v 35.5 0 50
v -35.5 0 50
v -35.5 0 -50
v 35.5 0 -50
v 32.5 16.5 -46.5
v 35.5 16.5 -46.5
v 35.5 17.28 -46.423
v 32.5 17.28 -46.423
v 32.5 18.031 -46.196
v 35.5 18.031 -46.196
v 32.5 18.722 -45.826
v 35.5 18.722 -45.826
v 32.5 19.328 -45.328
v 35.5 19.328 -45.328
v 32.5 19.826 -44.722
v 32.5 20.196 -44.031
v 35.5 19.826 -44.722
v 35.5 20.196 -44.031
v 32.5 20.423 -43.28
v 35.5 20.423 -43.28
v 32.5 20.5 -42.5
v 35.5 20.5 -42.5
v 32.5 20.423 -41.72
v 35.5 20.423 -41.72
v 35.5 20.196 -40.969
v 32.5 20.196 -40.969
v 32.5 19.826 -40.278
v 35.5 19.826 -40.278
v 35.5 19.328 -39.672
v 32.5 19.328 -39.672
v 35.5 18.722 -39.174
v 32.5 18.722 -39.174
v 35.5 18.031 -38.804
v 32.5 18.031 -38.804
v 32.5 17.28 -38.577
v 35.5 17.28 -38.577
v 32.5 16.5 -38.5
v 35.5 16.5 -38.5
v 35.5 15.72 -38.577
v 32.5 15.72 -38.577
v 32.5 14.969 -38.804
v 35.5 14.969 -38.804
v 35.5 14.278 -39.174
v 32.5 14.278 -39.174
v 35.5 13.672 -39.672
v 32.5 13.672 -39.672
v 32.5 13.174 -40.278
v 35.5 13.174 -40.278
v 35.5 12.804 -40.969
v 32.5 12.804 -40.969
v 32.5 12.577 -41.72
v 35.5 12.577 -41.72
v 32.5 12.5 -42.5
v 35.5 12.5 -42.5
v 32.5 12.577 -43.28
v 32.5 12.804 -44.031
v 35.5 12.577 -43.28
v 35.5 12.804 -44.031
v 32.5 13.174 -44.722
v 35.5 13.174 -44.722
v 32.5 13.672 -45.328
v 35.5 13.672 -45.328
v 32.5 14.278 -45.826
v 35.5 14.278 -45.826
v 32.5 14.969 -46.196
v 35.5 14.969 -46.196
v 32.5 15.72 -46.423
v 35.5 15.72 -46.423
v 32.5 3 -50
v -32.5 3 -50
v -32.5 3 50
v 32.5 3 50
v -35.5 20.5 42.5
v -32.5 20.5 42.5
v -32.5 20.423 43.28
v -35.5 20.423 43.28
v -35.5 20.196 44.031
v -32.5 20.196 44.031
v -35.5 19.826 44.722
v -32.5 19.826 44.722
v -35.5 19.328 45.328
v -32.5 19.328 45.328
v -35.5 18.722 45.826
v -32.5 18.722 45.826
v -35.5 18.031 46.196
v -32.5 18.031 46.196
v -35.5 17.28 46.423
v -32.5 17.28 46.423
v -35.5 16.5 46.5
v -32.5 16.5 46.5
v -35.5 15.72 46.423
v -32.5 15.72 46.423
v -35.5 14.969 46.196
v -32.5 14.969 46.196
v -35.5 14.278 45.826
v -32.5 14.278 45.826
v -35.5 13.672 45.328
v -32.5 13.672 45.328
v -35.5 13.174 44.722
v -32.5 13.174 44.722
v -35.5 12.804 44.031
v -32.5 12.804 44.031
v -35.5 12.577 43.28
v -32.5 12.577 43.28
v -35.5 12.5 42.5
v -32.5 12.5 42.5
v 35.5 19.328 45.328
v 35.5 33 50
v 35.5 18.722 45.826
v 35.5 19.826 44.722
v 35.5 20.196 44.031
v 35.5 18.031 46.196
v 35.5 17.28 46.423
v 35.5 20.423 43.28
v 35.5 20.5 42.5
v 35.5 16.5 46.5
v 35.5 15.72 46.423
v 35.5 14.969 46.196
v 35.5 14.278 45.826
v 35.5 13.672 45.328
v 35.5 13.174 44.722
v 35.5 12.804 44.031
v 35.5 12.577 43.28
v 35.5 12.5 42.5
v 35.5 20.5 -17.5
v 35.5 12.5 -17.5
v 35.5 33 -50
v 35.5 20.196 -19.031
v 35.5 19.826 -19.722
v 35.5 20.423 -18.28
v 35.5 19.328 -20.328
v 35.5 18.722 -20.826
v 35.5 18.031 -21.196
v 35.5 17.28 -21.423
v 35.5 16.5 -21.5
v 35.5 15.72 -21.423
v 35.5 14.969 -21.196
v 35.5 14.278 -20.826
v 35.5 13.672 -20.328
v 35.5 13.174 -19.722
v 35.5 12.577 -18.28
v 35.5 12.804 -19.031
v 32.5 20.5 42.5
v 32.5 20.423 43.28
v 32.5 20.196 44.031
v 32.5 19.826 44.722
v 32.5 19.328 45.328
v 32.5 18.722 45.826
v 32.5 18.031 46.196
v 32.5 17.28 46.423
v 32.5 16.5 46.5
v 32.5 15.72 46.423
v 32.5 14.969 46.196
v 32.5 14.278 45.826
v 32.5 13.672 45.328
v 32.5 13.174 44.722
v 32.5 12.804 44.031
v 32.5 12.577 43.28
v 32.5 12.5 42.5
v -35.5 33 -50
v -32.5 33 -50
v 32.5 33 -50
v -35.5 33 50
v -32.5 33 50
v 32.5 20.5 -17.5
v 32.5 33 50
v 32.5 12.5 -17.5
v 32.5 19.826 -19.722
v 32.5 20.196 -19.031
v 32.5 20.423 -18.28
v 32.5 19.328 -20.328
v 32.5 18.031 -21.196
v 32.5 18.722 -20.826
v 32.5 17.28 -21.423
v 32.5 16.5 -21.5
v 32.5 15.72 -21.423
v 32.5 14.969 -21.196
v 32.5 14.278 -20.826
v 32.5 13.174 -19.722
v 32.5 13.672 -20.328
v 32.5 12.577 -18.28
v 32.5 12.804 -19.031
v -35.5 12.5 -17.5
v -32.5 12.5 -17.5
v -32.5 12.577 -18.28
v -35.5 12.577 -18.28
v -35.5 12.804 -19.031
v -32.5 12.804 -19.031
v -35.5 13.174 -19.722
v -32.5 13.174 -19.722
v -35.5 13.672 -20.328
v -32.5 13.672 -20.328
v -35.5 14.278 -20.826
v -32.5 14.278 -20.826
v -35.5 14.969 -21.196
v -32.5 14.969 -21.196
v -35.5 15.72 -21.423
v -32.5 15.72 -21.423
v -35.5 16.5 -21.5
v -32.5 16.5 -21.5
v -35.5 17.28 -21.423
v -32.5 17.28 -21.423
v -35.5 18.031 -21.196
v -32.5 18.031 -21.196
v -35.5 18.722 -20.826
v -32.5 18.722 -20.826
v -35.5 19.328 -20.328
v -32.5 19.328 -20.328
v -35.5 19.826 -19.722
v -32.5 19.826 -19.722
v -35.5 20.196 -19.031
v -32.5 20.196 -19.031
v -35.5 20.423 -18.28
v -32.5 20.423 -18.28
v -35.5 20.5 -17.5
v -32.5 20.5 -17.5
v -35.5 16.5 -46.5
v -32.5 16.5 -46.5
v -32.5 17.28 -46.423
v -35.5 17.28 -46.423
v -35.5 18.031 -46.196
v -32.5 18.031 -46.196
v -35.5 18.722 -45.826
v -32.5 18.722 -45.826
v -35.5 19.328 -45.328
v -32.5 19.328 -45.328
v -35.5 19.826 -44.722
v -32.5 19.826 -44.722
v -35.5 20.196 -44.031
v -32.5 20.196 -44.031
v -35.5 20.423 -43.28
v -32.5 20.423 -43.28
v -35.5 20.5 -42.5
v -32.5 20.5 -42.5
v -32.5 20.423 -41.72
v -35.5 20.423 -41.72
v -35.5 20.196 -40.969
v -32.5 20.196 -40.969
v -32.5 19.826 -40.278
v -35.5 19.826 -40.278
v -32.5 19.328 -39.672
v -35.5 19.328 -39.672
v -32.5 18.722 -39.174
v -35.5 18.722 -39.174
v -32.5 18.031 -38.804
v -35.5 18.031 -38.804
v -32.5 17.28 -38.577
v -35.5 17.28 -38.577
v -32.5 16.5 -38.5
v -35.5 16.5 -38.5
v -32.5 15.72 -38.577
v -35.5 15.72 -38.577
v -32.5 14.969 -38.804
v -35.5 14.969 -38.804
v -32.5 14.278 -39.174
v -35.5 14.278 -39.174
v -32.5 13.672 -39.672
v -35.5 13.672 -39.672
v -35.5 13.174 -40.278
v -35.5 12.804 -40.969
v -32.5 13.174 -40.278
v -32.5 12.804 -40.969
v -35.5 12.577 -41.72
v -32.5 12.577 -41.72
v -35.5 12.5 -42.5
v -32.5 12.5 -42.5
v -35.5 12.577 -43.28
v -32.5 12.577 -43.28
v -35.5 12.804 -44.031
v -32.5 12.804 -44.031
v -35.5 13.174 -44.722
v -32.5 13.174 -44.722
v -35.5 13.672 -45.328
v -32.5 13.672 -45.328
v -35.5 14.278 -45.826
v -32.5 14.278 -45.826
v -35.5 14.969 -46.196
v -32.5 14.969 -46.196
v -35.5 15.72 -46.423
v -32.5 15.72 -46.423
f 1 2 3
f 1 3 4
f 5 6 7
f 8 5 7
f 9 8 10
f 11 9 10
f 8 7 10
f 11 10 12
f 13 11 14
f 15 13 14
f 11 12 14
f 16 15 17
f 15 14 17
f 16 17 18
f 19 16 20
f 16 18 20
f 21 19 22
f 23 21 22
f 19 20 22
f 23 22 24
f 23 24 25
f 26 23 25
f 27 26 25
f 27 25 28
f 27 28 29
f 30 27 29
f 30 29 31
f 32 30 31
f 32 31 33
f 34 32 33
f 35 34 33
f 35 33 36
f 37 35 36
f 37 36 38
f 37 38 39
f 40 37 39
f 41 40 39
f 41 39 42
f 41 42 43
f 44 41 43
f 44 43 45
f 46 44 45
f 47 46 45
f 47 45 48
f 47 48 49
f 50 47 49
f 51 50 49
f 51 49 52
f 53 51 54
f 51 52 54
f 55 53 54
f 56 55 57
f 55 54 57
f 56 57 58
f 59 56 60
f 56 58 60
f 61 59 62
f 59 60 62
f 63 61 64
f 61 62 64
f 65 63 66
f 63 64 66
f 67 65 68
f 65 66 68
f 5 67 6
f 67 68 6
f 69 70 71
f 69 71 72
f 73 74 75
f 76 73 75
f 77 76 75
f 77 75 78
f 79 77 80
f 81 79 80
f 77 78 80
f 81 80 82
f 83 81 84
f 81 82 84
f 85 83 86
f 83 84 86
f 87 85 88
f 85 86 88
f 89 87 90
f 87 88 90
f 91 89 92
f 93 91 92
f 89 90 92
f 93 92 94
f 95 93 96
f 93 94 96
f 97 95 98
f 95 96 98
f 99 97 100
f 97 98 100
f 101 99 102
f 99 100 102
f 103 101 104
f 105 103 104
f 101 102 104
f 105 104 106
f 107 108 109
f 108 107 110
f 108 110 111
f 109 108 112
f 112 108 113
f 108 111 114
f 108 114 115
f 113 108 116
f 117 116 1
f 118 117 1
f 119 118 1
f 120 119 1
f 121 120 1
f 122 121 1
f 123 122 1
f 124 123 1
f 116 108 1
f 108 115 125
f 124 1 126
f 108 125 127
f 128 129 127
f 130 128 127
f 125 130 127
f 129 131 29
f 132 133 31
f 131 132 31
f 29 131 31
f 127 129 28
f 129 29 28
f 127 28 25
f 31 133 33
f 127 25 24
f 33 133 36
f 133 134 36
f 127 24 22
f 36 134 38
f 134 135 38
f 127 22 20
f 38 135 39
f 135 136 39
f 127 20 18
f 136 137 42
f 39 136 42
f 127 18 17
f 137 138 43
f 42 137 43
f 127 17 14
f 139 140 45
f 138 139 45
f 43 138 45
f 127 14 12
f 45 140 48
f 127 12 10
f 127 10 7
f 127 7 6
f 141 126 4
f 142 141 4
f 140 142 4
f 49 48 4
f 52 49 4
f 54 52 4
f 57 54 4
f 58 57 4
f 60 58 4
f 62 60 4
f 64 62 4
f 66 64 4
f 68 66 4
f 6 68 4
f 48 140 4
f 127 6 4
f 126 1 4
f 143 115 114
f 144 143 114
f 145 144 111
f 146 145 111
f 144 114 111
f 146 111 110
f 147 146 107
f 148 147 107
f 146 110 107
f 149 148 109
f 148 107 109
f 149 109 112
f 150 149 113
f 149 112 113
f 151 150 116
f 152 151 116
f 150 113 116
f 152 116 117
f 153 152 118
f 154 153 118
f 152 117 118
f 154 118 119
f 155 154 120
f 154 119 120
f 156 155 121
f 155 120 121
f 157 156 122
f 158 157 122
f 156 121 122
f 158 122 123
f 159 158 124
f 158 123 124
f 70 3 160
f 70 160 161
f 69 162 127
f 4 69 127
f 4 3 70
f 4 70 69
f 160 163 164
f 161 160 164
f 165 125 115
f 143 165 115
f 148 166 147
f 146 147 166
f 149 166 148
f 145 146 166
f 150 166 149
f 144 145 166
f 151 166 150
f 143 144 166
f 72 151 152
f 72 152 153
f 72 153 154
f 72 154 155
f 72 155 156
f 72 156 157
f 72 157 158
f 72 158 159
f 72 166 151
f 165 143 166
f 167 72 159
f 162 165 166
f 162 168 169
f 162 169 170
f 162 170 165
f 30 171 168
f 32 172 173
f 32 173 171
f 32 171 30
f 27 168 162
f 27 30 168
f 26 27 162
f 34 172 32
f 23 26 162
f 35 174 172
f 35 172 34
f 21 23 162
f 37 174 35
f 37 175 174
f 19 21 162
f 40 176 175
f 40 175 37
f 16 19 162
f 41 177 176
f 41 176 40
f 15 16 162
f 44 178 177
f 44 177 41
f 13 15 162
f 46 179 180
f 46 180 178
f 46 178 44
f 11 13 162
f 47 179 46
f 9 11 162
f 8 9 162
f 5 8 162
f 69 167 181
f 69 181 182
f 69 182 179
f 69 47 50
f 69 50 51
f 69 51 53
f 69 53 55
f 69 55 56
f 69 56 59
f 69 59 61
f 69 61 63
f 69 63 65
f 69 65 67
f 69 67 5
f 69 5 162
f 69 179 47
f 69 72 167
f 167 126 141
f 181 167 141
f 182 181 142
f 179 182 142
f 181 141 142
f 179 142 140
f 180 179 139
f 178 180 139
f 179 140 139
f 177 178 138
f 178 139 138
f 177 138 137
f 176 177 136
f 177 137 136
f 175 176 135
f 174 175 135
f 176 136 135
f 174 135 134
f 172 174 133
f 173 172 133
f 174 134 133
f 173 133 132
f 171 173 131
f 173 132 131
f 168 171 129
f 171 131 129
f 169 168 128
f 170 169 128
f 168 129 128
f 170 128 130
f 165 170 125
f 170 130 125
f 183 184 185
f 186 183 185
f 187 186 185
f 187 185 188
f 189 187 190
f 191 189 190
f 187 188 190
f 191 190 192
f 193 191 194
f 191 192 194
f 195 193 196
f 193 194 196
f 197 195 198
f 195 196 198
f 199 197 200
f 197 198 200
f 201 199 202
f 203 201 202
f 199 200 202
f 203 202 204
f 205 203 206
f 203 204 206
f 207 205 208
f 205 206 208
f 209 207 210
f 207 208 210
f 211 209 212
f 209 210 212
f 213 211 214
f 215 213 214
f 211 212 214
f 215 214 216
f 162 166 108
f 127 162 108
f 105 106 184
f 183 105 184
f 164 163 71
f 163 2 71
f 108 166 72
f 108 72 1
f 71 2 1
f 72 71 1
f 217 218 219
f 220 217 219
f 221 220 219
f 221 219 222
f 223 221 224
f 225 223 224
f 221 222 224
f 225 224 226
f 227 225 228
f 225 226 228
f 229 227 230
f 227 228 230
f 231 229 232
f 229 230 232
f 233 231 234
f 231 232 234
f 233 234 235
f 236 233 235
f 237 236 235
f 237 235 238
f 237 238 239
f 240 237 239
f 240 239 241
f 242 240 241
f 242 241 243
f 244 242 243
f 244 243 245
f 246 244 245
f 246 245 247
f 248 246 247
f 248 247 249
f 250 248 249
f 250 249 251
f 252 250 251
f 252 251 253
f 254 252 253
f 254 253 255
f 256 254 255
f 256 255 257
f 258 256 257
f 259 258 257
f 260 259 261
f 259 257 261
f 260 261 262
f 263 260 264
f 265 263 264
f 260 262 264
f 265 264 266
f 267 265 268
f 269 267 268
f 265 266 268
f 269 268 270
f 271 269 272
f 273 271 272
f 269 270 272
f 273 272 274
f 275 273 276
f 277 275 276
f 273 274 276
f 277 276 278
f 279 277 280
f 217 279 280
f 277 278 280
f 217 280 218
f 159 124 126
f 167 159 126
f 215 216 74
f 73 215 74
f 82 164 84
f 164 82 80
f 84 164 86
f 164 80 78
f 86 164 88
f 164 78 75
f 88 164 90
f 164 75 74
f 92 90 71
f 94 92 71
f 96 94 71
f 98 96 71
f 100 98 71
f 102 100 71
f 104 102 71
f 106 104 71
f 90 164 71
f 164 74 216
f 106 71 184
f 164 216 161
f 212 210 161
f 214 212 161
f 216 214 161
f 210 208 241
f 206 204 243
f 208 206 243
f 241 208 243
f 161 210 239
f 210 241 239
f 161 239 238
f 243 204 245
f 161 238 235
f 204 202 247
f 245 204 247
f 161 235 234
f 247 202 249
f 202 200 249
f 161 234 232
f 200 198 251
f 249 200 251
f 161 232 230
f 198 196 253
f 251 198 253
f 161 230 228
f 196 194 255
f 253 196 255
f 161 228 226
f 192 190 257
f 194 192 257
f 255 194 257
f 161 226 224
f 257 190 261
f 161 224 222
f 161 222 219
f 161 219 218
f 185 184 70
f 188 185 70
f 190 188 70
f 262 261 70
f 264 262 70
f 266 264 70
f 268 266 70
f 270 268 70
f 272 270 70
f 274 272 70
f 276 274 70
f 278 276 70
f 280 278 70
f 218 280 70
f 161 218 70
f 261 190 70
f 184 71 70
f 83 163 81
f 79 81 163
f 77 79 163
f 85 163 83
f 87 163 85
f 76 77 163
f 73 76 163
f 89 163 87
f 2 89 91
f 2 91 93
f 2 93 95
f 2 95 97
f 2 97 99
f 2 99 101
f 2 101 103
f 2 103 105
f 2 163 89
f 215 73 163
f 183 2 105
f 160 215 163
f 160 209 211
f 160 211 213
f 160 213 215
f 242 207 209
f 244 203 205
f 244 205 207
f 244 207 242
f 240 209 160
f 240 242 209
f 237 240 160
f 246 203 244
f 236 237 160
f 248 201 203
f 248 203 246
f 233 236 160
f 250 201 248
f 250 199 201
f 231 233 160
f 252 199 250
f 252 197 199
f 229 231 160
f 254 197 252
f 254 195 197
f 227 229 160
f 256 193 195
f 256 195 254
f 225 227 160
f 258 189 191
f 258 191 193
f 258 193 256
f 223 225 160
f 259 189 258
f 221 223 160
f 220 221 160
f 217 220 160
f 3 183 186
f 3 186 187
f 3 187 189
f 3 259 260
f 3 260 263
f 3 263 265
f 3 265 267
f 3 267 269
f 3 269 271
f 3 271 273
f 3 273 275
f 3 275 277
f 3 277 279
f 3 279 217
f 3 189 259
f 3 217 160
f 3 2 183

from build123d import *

# Parameters (mm, degrees)
SKETCH_1_W          = 71
SKETCH_1_H          = 100
EXTRUDE_1_DEPTH     = 3
SKETCH_2_W          = 3
SKETCH_2_H          = 100
EXTRUDE_2_DEPTH     = 30
CUT_EXTRUDE_1_REACH = 94.898
SKETCH_3_R          = 4


with BuildPart() as part:
    # 草图1 → 凸台-拉伸1 (new body)
    with BuildSketch(Plane(origin=(0, 0, 0), x_dir=(1, 0, 0), z_dir=(0, 1, 0))):
        Rectangle(SKETCH_1_W, SKETCH_1_H)
    extrude(amount=EXTRUDE_1_DEPTH)

    # 草图2 → 凸台-拉伸2 (add)
    with BuildSketch(Plane(origin=(0, 3, 0), x_dir=(1, 0, 0), z_dir=(0, 1, 0))):
        with Locations((-34, 0)):
            Rectangle(SKETCH_2_W, SKETCH_2_H)
        with Locations((34, 0)):
            Rectangle(SKETCH_2_W, SKETCH_2_H)
    extrude(amount=EXTRUDE_2_DEPTH)

    # 切除-拉伸1: up to this face of the body (flat: up to its plane)
    cut_extrude_1_end = Plane(part.part.faces().sort_by_distance((-35.5, 16.5, 0))[0])
    # 草图3 → 切除-拉伸1 (cut, up to the picked face)
    with BuildSketch(Plane(origin=(35.5, 0, 0), x_dir=(0, 0, -1), z_dir=(1, 0, 0)), mode=Mode.PRIVATE) as cut_extrude_1_sk1:
        with Locations((42.5, 16.5)):
            Circle(SKETCH_3_R)
    cut_extrude_1_tool1 = split(extrude(cut_extrude_1_sk1.sketch, amount=-CUT_EXTRUDE_1_REACH, mode=Mode.PRIVATE), bisect_by=cut_extrude_1_end, keep=Keep.BOTH, mode=Mode.PRIVATE)
    # 草图3 → 切除-拉伸1 (cut, up to the picked face)
    with BuildSketch(Plane(origin=(35.5, 0, 0), x_dir=(0, 0, -1), z_dir=(1, 0, 0)), mode=Mode.PRIVATE) as cut_extrude_1_sk2:
        with BuildLine():
            Line((-42.5, 12.5), (17.5, 12.5))
            ThreePointArc((17.5, 12.5), (21.5, 16.5), (17.5, 20.5))
            Line((17.5, 20.5), (-42.5, 20.5))
            ThreePointArc((-42.5, 20.5), (-46.5, 16.5), (-42.5, 12.5))
        make_face()
    cut_extrude_1_tool2 = split(extrude(cut_extrude_1_sk2.sketch, amount=-CUT_EXTRUDE_1_REACH, mode=Mode.PRIVATE), bisect_by=cut_extrude_1_end, keep=Keep.BOTH, mode=Mode.PRIVATE)
    add(cut_extrude_1_tool1.solids().sort_by(Axis((35.5, 16.5, -42.5), (-1, 0, 0)))[0], mode=Mode.SUBTRACT)
    add(cut_extrude_1_tool2.solids().sort_by(Axis((35.5, 16.5, 12.5), (-1, 0, 0)))[0], mode=Mode.SUBTRACT)


solid = part.part
